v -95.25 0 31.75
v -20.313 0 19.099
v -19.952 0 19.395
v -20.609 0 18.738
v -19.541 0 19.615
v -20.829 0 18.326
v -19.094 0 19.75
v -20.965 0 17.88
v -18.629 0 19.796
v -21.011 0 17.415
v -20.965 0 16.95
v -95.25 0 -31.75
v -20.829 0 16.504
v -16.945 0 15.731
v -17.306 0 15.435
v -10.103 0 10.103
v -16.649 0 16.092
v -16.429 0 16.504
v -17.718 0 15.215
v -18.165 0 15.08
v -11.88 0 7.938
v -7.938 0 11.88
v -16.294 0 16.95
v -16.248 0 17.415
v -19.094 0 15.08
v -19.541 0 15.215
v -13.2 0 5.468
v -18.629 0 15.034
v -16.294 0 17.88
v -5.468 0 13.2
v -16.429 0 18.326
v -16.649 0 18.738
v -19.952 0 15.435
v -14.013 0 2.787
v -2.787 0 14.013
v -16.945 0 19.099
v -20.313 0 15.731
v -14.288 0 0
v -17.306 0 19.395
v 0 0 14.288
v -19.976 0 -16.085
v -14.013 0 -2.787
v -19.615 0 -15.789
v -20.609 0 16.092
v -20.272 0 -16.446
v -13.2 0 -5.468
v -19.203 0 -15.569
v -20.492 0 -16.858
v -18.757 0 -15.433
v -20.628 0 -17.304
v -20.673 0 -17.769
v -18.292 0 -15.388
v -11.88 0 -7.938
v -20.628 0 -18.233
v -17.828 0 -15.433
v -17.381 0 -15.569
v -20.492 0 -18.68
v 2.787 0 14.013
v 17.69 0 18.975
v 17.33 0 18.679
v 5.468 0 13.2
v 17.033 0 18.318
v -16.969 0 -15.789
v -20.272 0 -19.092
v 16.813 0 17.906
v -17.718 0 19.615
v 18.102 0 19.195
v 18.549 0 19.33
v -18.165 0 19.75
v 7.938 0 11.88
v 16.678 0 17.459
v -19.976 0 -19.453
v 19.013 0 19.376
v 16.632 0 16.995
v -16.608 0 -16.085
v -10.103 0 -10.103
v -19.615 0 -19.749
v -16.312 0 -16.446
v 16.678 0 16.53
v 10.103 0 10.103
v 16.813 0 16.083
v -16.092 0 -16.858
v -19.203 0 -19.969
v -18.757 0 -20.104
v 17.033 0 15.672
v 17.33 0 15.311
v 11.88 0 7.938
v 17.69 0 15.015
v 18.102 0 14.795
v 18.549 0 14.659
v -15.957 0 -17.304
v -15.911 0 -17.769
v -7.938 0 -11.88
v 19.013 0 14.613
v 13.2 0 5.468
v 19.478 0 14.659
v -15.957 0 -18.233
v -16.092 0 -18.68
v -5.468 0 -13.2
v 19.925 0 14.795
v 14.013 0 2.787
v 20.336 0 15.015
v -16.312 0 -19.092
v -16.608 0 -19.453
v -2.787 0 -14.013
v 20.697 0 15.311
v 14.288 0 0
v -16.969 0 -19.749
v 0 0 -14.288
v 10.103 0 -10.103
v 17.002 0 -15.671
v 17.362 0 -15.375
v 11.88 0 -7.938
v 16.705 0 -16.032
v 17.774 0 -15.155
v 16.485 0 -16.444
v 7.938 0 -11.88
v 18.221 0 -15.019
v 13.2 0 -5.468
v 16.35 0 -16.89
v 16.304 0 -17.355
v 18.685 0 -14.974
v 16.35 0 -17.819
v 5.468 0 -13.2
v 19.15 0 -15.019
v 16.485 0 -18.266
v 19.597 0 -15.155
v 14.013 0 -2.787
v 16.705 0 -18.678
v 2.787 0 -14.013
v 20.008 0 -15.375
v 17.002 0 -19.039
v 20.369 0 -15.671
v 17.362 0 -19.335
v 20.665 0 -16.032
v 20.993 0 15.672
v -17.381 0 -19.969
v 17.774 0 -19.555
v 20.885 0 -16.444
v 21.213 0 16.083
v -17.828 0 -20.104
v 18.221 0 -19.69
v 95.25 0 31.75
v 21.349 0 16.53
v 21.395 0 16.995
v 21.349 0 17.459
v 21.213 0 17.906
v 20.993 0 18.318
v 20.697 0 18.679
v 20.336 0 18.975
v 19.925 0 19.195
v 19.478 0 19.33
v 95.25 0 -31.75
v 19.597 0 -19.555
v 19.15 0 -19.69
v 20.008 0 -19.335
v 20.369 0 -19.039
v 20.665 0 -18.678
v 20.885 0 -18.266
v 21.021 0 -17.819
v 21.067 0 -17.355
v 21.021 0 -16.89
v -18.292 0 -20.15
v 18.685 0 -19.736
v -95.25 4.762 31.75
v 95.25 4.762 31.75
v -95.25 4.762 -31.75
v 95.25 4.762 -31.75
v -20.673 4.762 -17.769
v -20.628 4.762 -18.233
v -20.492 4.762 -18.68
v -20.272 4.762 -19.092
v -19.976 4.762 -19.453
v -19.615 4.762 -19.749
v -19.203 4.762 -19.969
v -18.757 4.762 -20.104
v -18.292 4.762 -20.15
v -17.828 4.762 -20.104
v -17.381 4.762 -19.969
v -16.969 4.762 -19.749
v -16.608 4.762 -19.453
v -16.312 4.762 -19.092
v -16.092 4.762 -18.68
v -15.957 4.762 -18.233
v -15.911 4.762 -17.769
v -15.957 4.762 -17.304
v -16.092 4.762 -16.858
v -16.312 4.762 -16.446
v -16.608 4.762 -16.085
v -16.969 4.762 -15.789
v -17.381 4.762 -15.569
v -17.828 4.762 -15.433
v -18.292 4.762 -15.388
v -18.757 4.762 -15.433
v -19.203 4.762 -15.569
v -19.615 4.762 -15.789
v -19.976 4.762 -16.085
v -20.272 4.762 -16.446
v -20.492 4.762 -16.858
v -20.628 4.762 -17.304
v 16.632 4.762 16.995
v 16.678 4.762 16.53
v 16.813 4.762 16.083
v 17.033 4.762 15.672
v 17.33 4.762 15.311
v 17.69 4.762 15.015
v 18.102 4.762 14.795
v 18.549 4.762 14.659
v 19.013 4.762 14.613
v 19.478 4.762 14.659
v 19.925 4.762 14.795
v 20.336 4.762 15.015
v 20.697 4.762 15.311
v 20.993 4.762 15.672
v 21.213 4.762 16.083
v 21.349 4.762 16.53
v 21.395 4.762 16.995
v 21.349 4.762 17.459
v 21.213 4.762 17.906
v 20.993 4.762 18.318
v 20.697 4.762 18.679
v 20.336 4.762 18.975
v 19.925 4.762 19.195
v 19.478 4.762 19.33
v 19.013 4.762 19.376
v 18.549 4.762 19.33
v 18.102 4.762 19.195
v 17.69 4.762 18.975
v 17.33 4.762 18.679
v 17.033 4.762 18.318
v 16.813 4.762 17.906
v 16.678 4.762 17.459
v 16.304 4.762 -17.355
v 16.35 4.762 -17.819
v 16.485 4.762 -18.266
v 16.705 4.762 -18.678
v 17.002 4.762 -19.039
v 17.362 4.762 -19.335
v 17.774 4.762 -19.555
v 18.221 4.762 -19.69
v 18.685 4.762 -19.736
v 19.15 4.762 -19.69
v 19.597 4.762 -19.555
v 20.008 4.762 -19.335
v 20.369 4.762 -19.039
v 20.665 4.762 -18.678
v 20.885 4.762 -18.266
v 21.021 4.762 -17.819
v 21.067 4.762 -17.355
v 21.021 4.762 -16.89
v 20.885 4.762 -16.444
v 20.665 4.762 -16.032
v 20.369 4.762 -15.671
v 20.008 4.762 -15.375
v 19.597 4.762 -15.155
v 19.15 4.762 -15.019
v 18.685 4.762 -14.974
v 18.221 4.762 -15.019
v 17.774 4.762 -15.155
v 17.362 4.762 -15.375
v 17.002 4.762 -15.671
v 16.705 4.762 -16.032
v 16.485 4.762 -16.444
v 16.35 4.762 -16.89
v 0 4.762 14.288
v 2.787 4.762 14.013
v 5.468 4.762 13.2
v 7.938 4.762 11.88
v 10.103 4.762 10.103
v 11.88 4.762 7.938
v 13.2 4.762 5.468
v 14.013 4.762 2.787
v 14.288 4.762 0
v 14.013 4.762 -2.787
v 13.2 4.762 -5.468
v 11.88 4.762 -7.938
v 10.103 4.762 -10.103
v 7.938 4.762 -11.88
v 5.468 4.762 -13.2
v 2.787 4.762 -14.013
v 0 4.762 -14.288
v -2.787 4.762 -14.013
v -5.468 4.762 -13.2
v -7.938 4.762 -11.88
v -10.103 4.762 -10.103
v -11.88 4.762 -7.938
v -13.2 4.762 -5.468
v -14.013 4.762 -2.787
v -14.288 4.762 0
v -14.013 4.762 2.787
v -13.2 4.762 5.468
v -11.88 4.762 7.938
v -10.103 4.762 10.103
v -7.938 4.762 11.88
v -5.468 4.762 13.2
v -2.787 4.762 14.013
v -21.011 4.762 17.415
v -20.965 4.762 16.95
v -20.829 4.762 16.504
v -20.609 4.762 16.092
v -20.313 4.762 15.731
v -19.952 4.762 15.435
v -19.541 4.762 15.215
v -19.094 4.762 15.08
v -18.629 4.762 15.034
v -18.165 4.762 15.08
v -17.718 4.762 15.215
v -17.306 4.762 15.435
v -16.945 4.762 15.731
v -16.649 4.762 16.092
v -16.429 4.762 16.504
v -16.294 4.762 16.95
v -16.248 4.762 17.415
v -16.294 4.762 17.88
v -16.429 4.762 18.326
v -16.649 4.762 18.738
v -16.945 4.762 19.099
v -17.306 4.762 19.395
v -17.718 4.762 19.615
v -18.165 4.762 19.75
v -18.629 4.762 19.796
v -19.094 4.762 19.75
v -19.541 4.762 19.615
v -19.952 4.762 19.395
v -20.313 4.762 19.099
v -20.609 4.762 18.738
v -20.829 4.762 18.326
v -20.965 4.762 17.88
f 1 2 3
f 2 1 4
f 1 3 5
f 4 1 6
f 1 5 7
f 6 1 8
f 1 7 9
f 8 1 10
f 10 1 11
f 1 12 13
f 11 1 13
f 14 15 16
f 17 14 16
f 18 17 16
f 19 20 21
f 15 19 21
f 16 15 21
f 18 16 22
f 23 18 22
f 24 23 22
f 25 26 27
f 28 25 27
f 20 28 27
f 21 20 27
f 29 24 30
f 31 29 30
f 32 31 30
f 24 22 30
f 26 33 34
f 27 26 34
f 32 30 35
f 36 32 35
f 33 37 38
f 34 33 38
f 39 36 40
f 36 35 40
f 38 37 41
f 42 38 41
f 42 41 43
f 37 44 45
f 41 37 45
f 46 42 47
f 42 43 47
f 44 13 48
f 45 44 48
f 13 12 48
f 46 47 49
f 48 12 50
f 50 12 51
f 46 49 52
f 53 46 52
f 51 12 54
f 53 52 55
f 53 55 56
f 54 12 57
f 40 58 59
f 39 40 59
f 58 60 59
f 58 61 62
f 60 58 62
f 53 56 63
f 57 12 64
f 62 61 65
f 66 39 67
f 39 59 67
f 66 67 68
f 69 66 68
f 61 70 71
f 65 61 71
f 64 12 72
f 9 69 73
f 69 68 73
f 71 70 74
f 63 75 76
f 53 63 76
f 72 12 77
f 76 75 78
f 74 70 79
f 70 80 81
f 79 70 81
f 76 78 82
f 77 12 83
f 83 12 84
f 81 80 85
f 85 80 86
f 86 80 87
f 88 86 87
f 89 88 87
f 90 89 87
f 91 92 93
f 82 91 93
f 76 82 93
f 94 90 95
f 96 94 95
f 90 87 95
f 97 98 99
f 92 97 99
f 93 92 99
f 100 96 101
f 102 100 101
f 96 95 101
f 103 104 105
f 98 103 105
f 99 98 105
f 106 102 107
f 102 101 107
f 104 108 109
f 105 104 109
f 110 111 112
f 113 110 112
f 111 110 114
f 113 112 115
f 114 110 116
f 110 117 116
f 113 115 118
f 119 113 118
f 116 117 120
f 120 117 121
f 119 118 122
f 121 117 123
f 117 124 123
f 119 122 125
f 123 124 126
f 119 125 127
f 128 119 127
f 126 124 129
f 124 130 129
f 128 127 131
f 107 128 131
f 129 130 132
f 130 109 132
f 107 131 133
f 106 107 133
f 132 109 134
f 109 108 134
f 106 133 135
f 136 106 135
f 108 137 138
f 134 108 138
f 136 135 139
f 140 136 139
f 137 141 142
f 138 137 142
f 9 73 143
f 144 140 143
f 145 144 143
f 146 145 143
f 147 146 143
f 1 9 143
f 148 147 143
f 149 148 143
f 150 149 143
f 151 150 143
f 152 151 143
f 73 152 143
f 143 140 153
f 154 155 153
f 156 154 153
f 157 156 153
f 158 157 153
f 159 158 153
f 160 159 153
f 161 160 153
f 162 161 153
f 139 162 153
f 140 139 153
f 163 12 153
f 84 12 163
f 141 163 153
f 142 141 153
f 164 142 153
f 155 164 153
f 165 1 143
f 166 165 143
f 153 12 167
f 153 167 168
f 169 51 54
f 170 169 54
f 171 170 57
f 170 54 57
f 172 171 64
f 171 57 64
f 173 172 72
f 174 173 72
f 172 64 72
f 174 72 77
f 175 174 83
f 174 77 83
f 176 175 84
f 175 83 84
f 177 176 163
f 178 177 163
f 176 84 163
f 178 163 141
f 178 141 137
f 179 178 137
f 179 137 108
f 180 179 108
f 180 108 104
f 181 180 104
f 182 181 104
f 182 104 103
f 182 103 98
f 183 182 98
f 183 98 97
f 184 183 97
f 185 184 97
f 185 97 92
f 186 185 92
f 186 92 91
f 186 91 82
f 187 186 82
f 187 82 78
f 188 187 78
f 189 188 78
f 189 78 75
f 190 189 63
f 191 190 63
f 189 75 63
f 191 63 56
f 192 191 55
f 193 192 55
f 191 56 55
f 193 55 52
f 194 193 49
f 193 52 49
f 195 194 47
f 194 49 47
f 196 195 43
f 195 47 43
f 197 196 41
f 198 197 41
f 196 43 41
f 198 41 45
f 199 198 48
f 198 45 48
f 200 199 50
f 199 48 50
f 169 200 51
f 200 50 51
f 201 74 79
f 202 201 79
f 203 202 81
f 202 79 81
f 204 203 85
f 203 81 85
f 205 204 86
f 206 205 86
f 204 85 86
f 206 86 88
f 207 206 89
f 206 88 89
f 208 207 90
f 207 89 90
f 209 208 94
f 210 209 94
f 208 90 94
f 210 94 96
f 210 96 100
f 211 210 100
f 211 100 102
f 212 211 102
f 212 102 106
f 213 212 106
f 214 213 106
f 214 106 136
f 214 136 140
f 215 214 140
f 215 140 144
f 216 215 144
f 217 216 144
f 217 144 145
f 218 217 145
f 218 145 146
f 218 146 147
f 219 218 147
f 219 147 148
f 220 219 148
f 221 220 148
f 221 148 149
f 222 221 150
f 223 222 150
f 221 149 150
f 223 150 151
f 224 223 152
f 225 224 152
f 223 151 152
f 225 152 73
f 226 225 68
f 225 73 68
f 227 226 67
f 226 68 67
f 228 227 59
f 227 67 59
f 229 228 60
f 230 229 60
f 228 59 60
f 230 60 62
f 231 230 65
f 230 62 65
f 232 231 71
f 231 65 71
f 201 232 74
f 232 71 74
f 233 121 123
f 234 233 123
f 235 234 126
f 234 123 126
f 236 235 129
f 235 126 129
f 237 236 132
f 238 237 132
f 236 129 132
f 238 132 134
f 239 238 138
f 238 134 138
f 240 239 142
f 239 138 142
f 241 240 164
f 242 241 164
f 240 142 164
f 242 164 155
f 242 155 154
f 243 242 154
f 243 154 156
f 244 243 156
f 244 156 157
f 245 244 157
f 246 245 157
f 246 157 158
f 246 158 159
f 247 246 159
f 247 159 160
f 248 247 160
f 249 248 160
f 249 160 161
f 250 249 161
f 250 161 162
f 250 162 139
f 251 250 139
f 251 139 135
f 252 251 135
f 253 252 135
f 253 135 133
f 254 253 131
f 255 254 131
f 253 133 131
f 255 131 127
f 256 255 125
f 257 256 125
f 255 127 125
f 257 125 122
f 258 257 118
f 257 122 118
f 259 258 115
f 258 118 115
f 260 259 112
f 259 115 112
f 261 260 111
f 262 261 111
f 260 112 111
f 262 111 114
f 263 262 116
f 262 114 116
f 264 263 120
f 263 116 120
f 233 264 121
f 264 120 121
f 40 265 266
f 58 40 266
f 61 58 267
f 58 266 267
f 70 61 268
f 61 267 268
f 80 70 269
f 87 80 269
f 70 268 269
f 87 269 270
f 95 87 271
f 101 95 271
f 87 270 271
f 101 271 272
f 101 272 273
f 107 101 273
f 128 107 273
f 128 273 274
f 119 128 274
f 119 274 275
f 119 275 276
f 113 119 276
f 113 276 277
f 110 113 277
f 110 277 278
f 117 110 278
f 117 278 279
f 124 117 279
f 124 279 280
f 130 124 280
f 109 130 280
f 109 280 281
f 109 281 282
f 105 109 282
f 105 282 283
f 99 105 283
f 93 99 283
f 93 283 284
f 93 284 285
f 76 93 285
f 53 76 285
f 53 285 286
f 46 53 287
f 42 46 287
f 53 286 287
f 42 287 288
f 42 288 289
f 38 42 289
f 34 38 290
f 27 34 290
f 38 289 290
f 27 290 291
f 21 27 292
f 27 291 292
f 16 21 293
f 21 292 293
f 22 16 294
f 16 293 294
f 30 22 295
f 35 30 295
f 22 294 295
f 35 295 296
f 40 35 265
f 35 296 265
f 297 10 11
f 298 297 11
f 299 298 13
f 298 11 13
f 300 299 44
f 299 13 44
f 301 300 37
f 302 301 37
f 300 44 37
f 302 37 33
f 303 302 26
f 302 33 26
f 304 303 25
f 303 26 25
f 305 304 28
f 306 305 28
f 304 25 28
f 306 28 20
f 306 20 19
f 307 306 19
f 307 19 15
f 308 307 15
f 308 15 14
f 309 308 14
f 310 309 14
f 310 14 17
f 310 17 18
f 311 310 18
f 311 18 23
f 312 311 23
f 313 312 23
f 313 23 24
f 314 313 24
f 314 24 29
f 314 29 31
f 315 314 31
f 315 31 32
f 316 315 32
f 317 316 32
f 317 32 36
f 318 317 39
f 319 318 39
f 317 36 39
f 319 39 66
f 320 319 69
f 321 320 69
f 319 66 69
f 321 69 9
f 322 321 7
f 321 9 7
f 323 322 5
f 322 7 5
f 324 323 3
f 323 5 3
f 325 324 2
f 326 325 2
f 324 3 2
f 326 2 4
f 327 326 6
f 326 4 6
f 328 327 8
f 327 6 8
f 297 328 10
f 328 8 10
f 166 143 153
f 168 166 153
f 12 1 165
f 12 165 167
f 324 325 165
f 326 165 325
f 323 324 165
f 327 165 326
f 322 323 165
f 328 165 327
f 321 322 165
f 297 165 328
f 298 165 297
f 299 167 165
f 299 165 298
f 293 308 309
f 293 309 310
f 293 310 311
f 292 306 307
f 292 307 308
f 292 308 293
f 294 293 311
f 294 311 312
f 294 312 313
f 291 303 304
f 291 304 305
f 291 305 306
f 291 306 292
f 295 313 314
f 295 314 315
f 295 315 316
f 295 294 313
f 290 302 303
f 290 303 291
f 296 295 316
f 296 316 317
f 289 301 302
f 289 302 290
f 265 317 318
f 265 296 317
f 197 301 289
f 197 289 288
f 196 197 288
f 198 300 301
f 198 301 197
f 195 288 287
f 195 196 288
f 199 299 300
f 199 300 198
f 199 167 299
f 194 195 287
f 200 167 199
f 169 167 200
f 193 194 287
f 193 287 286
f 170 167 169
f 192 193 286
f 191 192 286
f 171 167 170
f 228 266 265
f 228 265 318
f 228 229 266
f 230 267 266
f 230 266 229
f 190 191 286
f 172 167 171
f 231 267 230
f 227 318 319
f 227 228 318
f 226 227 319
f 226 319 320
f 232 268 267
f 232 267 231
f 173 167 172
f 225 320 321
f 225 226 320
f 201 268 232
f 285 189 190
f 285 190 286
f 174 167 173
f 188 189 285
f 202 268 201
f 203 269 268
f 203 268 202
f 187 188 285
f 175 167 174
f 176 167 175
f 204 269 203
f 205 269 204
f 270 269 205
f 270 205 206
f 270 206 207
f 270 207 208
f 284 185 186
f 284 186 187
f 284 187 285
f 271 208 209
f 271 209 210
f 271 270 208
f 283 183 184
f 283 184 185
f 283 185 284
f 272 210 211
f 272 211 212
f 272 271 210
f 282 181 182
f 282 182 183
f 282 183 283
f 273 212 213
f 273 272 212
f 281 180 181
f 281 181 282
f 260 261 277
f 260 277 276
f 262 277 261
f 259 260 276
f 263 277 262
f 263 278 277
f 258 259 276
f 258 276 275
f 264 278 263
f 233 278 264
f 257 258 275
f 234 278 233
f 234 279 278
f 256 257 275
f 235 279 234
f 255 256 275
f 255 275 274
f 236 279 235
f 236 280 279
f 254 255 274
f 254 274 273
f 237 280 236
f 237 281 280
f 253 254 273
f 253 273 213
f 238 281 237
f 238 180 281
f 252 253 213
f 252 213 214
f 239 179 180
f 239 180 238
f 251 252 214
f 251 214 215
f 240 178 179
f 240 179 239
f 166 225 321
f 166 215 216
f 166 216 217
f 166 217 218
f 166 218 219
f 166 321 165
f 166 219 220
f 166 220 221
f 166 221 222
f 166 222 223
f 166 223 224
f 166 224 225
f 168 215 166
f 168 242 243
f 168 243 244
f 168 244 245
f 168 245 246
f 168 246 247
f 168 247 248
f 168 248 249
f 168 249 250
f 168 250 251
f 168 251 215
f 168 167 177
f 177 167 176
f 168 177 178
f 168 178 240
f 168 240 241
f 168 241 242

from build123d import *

# Parameters (mm, degrees)
SKETCH1_W                      = 190.5
SKETCH1_H                      = 63.5
BOSS_EXTRUDE1_DEPTH            = 4.7625
SKETCH3_R                      = 14.2875
CUT_EXTRUDE1_DEPTH             = 101.515204851
F_3_16_0_1875_DIAMETER_HOLE1_D = 4.7625


with BuildPart() as part:
    # Sketch1 → Boss-Extrude1 (new body)
    with BuildSketch(Plane(origin=(0, 0, 0), x_dir=(1, 0, 0), z_dir=(0, 1, 0))):
        Rectangle(SKETCH1_W, SKETCH1_H)
    extrude(amount=BOSS_EXTRUDE1_DEPTH)

    # Sketch3 → Cut-Extrude1 (cut, through all)
    with BuildSketch(Plane(origin=(0, 4.7625, 0), x_dir=(1, 0, 0), z_dir=(0, 1, 0))):
        with Locations(Location((0, 0, 0), (0, 0, 270))):
            Circle(SKETCH3_R)
    extrude(amount=-CUT_EXTRUDE1_DEPTH, mode=Mode.SUBTRACT)

    # 3/16 (0.1875) Diameter Hole1 (through all)
    with Locations(Plane(origin=(0, 4.7625, 0), x_dir=(1, 0, 0), z_dir=(0, 1, 0))):
        with Locations((-18.292133046, 17.768777988), (-18.629263442, -17.414997737), (18.68533355, 17.354823903), (19.013431756, -16.994734933)):
            Hole(F_3_16_0_1875_DIAMETER_HOLE1_D / 2)


solid = part.part
